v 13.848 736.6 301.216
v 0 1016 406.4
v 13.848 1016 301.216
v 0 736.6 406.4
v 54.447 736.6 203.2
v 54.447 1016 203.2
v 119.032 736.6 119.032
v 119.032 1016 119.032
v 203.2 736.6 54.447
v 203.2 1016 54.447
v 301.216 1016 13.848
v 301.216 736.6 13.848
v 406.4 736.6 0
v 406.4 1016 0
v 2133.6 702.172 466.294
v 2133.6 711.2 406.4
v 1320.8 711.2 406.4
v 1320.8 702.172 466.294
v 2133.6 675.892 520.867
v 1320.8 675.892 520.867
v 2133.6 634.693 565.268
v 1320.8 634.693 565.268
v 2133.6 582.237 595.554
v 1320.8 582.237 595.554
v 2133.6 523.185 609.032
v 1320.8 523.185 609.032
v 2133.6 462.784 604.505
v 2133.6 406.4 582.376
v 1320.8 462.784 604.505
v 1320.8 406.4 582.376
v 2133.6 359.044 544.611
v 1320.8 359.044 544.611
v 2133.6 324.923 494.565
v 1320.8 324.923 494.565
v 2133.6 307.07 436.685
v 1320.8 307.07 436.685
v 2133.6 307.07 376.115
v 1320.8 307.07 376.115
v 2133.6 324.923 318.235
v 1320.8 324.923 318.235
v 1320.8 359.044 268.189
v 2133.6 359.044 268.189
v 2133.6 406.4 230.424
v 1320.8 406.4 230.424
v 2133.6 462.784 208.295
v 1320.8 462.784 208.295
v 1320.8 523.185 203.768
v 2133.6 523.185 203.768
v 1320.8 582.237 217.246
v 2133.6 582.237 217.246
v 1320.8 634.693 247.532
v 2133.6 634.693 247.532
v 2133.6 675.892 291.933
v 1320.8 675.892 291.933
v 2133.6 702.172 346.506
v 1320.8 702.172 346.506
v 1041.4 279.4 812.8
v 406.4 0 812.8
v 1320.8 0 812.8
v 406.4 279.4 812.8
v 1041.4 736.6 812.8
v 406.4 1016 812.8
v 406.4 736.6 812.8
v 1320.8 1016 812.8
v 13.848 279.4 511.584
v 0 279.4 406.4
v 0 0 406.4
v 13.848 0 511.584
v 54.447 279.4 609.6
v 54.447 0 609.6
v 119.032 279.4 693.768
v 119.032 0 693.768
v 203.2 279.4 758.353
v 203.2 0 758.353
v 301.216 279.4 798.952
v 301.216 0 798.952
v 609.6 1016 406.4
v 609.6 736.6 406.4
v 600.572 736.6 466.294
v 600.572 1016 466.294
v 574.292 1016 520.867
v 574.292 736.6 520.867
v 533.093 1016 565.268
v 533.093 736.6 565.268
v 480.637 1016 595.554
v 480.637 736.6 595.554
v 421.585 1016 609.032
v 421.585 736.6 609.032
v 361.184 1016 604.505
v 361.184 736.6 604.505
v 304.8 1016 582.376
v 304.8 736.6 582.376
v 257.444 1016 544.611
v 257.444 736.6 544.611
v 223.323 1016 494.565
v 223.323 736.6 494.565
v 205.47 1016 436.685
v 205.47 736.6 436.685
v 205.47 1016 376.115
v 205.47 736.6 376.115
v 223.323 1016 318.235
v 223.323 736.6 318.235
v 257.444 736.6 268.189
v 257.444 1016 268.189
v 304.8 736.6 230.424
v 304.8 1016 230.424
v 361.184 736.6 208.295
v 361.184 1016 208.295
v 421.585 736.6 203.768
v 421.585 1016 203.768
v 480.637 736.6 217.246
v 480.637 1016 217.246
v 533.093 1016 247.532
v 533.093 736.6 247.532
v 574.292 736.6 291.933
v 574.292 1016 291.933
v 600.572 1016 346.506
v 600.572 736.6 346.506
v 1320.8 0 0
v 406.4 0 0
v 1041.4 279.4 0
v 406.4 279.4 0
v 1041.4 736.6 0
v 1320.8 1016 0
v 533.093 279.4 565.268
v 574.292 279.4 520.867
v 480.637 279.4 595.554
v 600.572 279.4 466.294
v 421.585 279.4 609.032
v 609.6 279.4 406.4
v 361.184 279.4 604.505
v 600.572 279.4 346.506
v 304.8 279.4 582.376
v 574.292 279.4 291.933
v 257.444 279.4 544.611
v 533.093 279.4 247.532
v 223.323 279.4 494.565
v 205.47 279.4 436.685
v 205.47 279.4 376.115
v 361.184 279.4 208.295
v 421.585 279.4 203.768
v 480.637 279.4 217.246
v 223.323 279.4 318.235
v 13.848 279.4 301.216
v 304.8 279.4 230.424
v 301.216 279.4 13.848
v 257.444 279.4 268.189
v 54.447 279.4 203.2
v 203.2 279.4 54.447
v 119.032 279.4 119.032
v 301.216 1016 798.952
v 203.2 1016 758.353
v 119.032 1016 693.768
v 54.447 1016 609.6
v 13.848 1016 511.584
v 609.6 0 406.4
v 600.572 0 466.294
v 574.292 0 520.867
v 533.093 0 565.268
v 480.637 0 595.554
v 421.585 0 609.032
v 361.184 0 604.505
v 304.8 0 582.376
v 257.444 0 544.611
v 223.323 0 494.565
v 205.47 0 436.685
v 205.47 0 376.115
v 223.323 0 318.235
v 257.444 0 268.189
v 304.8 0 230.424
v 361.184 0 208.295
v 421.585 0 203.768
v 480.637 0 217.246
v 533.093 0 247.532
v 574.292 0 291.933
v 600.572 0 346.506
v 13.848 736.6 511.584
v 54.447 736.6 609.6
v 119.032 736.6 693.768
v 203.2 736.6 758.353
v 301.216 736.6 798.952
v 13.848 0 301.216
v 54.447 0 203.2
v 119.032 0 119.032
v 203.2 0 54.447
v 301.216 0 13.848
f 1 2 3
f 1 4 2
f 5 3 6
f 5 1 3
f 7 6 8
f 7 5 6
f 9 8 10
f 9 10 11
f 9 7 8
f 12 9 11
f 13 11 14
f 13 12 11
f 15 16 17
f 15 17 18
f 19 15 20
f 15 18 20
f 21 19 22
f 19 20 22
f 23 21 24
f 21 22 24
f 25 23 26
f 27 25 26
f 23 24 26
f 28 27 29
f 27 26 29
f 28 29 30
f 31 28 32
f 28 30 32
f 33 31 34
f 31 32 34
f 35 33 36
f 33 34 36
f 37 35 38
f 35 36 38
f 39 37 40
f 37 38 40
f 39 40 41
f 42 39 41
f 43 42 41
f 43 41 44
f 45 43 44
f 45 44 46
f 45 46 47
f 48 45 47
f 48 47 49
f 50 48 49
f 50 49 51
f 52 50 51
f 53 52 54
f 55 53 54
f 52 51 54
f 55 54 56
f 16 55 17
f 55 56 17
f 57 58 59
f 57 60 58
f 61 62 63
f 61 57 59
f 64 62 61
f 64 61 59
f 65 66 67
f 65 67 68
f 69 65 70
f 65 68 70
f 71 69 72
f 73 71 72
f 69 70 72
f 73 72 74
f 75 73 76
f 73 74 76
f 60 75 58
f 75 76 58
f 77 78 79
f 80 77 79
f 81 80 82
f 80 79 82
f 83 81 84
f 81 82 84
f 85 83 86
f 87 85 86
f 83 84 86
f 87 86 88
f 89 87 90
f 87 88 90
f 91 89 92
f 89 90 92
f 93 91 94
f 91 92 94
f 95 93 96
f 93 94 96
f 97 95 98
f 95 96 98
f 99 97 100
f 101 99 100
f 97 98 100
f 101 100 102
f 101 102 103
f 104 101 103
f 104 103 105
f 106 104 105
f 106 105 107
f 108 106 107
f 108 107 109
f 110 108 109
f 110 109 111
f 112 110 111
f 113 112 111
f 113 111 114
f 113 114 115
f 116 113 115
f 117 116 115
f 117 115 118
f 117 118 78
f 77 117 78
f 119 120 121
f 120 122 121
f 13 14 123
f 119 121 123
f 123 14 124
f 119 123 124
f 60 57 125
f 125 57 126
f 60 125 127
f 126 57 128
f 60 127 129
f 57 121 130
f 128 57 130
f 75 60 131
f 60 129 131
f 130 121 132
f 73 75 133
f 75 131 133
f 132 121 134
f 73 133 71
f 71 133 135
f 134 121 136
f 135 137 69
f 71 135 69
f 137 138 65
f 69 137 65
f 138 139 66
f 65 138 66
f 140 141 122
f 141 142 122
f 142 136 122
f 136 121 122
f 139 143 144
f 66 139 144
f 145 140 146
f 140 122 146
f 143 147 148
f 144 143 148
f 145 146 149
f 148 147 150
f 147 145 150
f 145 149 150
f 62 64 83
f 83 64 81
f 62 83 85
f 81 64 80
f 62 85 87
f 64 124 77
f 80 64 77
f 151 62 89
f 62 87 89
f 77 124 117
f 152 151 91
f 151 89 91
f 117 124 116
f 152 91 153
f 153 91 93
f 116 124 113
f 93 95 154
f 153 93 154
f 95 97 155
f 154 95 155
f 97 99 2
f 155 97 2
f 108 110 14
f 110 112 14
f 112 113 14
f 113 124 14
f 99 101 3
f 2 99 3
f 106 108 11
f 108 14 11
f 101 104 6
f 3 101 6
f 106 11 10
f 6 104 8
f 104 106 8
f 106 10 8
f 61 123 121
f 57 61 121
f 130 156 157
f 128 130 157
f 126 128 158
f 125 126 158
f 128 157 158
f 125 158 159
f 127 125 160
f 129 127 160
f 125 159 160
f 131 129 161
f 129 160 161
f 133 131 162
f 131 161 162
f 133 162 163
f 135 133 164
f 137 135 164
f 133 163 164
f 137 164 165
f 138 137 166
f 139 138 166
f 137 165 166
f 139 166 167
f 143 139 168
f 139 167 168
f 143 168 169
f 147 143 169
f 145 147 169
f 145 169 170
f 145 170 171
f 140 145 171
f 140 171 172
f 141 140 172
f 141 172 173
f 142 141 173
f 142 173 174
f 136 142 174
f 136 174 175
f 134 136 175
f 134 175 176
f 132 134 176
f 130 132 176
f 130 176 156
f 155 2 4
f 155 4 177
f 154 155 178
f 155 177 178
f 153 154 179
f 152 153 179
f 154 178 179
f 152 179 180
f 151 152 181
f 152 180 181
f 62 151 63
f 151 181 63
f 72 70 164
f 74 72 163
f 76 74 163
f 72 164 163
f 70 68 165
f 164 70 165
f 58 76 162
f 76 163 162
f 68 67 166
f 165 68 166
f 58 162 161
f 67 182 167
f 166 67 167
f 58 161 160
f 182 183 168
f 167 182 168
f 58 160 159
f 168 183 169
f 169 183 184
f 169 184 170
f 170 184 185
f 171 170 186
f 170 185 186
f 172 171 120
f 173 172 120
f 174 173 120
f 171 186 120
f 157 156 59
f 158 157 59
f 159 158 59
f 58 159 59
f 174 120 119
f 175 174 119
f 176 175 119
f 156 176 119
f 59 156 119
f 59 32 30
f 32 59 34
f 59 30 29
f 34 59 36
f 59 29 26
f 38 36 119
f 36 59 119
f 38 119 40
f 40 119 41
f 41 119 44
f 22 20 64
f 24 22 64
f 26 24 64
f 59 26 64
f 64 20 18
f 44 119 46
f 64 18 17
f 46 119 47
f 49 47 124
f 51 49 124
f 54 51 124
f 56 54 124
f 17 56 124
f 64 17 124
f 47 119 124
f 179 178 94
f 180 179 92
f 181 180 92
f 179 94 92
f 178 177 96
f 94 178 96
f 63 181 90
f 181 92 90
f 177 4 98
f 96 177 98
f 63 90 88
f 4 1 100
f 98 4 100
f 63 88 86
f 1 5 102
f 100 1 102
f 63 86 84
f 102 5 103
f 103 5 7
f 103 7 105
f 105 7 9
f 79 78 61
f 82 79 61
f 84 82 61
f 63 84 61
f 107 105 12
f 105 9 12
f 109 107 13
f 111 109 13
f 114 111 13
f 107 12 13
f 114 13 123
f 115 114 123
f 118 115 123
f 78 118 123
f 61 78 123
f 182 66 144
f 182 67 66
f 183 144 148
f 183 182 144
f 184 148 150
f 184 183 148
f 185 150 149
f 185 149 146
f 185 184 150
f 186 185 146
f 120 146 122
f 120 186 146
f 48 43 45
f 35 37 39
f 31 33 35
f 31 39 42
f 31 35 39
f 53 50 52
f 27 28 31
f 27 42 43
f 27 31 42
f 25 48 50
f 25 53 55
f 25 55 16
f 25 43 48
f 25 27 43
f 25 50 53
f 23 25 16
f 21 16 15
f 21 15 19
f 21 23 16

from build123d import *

# Parameters (mm, degrees)
F1_DEPTH = 812.8
F2_R     = 406.39999
F3_R     = 203.2
F4_DEPTH = 1016.001
F5_R     = 203.2
F6_DEPTH = 812.8


# Not quite as in the source:
# - a fillet or chamfer is up to 0.001 mm smaller than in the source, because OpenCascade refuses the exact size


with BuildPart() as f1:
    # F0 (on Top) → F1 (new body)
    with BuildSketch(Plane.XY):
        Polygon((0, 279.4), (0, 0), (1320.8, 0), (1320.8, 1016), (0, 1016), (0, 736.6), (1041.4, 736.6), (1041.4, 279.4), align=None)
    extrude(amount=F1_DEPTH)

    # F2 (radius 406.4 in the source; OpenCascade refuses exactly that, so slightly less here)
    f2_edges = [f1.edges().sort_by_distance(p)[0] for p in [
        (0, 139.7, 812.8),
        (0, 139.7, 0),
        (0, 876.3, 0),
        (0, 876.3, 812.8),
    ]]
    fillet(f2_edges, radius=F2_R)

    # F3 (on face) → F4 (cut, through all)
    with BuildSketch(Plane.XZ):
        with Locations((406.4, 406.4)):
            Circle(F3_R)
    extrude(amount=-F4_DEPTH, mode=Mode.SUBTRACT)

    # F5 (on face) → F6 (join)
    with BuildSketch(Plane.YZ.offset(1320.8)):
        with Locations((508, 406.4)):
            Circle(F5_R)
    extrude(amount=F6_DEPTH)


solid = f1.part
